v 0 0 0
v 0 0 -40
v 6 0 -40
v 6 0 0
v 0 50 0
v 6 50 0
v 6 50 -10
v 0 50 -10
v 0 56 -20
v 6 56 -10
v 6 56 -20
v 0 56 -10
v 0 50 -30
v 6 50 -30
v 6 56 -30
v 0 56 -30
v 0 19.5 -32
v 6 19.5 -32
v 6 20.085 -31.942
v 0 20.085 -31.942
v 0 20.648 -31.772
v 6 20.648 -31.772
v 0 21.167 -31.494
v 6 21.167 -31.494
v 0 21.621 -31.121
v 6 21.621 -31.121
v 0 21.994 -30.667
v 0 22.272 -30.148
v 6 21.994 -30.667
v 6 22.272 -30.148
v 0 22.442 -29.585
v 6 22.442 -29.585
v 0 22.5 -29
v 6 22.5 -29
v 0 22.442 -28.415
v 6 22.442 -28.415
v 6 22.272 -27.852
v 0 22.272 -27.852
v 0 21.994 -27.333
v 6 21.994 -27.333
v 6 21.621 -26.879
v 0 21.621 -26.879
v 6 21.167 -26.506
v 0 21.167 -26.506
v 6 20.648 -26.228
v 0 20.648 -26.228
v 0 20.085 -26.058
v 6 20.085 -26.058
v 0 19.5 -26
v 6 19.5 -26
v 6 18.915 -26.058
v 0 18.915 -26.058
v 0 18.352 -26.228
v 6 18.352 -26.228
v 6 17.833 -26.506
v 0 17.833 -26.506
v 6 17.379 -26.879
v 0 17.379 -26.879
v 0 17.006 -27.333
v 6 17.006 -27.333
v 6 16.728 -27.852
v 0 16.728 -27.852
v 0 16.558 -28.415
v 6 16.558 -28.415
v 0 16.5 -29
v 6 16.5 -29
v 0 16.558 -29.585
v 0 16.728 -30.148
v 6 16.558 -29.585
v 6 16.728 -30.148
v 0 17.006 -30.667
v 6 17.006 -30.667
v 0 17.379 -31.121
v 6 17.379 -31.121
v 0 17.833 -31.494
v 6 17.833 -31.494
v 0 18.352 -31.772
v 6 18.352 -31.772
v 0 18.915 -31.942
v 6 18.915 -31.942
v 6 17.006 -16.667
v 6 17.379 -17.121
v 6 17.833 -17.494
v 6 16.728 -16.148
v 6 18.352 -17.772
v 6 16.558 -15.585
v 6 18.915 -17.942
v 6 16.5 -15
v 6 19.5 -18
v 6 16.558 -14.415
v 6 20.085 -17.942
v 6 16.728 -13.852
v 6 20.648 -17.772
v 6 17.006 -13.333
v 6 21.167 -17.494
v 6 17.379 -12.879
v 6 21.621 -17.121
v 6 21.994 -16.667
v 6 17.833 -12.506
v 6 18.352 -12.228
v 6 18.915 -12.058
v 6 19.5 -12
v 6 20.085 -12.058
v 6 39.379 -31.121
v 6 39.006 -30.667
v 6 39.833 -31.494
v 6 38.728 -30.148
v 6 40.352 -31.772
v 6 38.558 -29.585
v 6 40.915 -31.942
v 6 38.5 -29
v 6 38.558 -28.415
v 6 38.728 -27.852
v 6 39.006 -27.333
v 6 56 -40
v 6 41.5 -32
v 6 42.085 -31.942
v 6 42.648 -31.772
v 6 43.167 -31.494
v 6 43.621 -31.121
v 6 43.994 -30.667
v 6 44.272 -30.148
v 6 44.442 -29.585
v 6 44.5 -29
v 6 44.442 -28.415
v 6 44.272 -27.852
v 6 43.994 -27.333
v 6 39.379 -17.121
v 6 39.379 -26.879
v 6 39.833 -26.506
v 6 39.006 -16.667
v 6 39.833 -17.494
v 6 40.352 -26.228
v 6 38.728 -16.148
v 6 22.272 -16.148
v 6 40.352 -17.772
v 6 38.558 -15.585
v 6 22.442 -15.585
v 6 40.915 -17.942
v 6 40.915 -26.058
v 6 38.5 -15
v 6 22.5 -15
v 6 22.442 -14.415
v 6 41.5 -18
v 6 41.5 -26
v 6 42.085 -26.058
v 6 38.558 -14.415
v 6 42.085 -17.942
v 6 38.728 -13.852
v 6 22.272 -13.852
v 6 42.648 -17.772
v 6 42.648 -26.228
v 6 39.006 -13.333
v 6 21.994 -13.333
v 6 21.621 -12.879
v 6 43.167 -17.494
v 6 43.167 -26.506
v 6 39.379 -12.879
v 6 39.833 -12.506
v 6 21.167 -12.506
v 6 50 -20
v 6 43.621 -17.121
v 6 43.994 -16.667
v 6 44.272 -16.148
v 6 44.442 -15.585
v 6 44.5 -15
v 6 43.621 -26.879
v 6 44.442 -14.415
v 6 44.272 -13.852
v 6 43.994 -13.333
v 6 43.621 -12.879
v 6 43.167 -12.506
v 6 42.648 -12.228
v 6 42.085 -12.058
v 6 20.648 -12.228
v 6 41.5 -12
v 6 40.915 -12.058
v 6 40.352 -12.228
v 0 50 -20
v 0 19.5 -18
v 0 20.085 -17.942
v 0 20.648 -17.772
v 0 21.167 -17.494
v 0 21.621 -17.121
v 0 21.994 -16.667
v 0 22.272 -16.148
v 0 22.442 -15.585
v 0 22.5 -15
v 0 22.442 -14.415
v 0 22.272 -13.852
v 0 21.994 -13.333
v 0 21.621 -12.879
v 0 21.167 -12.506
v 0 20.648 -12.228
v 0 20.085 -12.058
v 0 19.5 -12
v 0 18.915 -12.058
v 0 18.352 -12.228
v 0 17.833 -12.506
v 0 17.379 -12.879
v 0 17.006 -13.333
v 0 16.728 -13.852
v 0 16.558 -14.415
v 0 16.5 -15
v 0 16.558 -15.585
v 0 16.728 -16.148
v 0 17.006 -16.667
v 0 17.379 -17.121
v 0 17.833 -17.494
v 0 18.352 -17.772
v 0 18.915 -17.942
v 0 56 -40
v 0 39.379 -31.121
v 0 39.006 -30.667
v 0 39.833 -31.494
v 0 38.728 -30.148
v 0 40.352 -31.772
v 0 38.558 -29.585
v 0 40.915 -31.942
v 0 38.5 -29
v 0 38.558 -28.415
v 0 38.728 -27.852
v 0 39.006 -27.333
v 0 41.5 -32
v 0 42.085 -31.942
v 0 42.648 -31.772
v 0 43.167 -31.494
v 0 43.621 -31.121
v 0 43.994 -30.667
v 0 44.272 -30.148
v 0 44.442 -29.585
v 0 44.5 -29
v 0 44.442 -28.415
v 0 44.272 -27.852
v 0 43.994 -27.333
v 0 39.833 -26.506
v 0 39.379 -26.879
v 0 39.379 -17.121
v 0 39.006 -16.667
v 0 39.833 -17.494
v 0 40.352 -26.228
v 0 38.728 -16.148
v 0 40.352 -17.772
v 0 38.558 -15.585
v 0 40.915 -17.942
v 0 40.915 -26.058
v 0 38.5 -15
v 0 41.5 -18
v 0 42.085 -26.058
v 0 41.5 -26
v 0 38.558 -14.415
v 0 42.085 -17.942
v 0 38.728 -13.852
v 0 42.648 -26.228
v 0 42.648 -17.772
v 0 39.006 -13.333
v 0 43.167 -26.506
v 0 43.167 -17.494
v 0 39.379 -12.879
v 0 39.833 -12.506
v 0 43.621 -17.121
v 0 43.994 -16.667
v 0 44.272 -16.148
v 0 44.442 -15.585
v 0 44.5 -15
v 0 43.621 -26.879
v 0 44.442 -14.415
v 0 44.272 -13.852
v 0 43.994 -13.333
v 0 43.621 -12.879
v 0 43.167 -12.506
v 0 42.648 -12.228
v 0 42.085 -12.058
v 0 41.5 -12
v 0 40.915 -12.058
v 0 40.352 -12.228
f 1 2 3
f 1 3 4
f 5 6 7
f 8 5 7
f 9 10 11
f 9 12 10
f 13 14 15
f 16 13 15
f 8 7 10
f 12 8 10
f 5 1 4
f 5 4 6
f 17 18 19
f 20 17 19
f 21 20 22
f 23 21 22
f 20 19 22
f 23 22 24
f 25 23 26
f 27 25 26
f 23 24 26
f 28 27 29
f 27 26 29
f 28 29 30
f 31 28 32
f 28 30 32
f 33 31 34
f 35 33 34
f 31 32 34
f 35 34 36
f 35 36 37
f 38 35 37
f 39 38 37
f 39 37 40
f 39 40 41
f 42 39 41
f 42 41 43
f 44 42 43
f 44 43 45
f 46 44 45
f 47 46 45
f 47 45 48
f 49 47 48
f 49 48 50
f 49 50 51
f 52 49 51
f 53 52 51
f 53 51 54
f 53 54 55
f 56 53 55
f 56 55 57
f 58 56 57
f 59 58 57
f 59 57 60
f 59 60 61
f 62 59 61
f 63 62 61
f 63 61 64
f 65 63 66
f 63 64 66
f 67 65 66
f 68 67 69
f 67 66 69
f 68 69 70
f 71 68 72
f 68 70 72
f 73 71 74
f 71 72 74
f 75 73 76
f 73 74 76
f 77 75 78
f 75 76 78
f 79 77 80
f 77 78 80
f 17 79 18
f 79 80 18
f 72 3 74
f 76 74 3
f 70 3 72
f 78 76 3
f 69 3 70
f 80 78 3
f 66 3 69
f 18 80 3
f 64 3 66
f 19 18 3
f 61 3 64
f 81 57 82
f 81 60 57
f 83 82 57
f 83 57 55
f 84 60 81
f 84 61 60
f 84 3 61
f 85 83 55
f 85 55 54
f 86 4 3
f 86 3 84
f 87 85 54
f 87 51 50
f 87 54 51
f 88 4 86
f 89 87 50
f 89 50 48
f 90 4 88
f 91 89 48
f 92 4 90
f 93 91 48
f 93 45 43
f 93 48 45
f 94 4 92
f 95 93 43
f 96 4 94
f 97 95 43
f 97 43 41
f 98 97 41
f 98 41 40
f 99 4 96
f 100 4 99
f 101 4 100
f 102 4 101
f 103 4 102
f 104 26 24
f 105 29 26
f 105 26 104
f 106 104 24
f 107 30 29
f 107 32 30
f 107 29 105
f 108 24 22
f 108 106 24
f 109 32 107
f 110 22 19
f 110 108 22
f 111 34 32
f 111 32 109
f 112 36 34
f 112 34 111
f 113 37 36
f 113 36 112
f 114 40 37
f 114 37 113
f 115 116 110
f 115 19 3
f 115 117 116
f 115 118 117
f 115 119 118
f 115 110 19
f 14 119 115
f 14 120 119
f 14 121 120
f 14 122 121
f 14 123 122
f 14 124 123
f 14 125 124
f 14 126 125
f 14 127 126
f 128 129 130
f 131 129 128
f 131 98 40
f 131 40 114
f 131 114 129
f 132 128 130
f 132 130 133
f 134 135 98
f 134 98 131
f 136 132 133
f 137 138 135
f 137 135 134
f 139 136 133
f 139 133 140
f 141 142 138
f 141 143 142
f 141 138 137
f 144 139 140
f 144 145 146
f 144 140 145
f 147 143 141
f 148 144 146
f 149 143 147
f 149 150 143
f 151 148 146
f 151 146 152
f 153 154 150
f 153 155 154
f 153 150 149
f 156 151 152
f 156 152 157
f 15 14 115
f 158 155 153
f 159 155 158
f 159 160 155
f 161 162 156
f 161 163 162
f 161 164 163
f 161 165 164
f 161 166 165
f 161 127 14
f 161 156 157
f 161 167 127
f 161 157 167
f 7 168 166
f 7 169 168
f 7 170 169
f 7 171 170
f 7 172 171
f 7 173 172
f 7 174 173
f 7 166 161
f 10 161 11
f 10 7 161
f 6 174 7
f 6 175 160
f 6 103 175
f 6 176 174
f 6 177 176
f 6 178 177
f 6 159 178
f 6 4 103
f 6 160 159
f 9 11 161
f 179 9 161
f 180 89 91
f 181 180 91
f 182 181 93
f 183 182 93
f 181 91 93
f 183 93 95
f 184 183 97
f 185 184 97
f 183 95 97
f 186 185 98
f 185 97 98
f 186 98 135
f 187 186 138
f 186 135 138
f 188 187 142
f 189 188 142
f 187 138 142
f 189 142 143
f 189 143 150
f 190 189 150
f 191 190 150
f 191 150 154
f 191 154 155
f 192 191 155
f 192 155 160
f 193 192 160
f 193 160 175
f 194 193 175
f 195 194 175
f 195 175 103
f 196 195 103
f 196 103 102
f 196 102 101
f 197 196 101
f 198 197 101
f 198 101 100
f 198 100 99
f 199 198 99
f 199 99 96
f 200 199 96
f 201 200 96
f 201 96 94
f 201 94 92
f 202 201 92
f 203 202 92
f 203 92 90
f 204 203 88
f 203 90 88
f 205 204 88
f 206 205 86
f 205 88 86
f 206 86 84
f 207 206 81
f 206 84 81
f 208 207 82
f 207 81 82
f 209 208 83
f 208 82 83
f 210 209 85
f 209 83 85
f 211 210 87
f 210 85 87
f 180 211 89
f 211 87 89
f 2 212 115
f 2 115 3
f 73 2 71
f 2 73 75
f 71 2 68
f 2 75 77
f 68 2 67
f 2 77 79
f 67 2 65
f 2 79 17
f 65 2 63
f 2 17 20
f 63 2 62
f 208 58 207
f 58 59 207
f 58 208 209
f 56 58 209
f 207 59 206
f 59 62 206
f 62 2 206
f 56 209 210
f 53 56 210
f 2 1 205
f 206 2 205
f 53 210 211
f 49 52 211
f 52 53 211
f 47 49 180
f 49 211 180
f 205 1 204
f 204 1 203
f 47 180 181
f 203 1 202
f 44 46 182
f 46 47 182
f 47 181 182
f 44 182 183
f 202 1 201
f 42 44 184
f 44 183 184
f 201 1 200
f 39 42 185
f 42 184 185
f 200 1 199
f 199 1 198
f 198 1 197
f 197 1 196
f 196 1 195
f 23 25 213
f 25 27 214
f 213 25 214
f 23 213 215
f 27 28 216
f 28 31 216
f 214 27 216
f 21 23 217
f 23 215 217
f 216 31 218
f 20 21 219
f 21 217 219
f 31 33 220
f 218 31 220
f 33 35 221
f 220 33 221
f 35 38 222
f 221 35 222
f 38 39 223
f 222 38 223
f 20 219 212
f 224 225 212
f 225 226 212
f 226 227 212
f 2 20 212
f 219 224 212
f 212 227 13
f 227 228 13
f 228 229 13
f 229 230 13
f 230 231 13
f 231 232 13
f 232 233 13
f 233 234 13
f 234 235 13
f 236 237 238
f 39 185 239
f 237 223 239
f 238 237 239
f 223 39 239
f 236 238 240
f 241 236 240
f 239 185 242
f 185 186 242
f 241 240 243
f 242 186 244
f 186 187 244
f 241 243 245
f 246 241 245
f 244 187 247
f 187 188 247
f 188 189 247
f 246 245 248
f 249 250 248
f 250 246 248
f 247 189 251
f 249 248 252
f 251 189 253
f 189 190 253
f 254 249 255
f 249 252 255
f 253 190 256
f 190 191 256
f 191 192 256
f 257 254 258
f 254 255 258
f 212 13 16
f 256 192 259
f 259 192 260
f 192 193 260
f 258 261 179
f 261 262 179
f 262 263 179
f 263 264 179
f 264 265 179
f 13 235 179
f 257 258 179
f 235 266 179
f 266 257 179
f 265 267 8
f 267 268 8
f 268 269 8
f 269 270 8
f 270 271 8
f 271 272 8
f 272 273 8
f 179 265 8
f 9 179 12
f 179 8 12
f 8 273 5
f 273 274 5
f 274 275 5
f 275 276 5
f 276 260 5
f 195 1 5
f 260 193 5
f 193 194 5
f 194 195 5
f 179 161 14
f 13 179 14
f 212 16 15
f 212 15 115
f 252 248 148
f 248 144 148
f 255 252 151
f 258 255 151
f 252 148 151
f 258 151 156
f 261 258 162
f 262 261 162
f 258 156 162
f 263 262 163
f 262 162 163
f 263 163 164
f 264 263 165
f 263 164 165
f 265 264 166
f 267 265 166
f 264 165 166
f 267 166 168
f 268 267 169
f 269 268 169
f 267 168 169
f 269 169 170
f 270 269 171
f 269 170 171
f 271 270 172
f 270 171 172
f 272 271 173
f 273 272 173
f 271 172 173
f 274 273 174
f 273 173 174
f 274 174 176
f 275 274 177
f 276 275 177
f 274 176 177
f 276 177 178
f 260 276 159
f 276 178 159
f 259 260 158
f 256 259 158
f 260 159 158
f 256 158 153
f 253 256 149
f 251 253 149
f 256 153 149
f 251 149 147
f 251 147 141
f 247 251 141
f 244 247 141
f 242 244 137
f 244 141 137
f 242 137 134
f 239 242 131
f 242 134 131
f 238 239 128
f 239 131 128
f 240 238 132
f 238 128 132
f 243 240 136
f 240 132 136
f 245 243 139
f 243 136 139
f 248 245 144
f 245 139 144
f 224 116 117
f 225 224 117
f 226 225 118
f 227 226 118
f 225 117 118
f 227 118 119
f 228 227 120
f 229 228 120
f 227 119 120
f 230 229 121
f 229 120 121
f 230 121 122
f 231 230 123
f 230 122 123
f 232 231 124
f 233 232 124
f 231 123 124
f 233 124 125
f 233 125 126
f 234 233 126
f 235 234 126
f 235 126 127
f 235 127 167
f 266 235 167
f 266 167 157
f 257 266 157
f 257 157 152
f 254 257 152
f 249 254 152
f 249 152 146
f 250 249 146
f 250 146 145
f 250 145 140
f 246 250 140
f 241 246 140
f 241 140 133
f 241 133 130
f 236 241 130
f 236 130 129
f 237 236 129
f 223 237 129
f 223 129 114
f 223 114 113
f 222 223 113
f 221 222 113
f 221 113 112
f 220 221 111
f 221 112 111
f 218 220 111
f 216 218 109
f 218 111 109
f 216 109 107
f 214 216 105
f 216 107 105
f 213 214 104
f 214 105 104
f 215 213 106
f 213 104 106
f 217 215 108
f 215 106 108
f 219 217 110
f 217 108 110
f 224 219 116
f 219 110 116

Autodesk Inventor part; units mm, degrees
ref_plane "YZ Plane" through (0, 0, 0) normal (1, 0, 0) x (0, 1, 0)
ref_plane "XZ Plane" through (0, 0, 0) normal (0, 1, 0) x (-1, 0, 0)
ref_plane "XY Plane" through (0, 0, 0) normal (0, 0, 1) x (1, 0, 0)
sketch "Sketch1" plane through (0, 0, 0) normal (1, 0, 0) x (0, 1, 0)
  line L0 (0, 0) -> (56, 0)
  line L1 (56, 0) -> (56, -40)
  line L2 (56, -40) -> (0, -40)
  line L3 (0, -40) -> (0, 0)
  dimension "d0" = 56
  dimension "d1" = 40
extrude "Extrusion1" add sketch "Sketch1" along normal blind 6
sketch "Sketch2" plane through (6, 0, 0) normal (1, 0, 0) x (0, 0, -1)
  line L0 (40, 56) -> (0, 56) projected
  line L1 (40, 56) -> (30, 56)
  line L2 (30, 56) -> (20, 56)
  line L3 (20, 56) -> (20, 50)
  line L4 (20, 50) -> (30, 50)
  line L5 (30, 50) -> (30, 56)
  point P0 (0, 0)
  dimension "d4" = 10
  dimension "d5" = 10
  dimension "d6" = 6
extrude "Extrusion2" cut sketch "Sketch2" against normal blind 6
pattern_linear "Rectangular Pattern1" count 2 spacing 20 along (0, 0, 1) of "Extrusion2"
sketch "Sketch3" plane through (6, 0, 0) normal (1, 0, 0) x (0, 0, -1)
  line L0 (30, 50) -> (30, 56) projected
  circle A0 centre (15, 41.5) radius 3
  circle A1 centre (29, 41.5) radius 3
  circle A2 centre (15, 19.5) radius 3
  circle A3 centre (29, 19.5) radius 3
  point P0 (0, 0)
  dimension "d14" = 6
  dimension "d16" = 6
  dimension "d18" = 6
  dimension "d19" = 6
extrude "Extrusion3" cut sketch "Sketch3" against normal blind 6
properties part number "e_arm holder 2"
